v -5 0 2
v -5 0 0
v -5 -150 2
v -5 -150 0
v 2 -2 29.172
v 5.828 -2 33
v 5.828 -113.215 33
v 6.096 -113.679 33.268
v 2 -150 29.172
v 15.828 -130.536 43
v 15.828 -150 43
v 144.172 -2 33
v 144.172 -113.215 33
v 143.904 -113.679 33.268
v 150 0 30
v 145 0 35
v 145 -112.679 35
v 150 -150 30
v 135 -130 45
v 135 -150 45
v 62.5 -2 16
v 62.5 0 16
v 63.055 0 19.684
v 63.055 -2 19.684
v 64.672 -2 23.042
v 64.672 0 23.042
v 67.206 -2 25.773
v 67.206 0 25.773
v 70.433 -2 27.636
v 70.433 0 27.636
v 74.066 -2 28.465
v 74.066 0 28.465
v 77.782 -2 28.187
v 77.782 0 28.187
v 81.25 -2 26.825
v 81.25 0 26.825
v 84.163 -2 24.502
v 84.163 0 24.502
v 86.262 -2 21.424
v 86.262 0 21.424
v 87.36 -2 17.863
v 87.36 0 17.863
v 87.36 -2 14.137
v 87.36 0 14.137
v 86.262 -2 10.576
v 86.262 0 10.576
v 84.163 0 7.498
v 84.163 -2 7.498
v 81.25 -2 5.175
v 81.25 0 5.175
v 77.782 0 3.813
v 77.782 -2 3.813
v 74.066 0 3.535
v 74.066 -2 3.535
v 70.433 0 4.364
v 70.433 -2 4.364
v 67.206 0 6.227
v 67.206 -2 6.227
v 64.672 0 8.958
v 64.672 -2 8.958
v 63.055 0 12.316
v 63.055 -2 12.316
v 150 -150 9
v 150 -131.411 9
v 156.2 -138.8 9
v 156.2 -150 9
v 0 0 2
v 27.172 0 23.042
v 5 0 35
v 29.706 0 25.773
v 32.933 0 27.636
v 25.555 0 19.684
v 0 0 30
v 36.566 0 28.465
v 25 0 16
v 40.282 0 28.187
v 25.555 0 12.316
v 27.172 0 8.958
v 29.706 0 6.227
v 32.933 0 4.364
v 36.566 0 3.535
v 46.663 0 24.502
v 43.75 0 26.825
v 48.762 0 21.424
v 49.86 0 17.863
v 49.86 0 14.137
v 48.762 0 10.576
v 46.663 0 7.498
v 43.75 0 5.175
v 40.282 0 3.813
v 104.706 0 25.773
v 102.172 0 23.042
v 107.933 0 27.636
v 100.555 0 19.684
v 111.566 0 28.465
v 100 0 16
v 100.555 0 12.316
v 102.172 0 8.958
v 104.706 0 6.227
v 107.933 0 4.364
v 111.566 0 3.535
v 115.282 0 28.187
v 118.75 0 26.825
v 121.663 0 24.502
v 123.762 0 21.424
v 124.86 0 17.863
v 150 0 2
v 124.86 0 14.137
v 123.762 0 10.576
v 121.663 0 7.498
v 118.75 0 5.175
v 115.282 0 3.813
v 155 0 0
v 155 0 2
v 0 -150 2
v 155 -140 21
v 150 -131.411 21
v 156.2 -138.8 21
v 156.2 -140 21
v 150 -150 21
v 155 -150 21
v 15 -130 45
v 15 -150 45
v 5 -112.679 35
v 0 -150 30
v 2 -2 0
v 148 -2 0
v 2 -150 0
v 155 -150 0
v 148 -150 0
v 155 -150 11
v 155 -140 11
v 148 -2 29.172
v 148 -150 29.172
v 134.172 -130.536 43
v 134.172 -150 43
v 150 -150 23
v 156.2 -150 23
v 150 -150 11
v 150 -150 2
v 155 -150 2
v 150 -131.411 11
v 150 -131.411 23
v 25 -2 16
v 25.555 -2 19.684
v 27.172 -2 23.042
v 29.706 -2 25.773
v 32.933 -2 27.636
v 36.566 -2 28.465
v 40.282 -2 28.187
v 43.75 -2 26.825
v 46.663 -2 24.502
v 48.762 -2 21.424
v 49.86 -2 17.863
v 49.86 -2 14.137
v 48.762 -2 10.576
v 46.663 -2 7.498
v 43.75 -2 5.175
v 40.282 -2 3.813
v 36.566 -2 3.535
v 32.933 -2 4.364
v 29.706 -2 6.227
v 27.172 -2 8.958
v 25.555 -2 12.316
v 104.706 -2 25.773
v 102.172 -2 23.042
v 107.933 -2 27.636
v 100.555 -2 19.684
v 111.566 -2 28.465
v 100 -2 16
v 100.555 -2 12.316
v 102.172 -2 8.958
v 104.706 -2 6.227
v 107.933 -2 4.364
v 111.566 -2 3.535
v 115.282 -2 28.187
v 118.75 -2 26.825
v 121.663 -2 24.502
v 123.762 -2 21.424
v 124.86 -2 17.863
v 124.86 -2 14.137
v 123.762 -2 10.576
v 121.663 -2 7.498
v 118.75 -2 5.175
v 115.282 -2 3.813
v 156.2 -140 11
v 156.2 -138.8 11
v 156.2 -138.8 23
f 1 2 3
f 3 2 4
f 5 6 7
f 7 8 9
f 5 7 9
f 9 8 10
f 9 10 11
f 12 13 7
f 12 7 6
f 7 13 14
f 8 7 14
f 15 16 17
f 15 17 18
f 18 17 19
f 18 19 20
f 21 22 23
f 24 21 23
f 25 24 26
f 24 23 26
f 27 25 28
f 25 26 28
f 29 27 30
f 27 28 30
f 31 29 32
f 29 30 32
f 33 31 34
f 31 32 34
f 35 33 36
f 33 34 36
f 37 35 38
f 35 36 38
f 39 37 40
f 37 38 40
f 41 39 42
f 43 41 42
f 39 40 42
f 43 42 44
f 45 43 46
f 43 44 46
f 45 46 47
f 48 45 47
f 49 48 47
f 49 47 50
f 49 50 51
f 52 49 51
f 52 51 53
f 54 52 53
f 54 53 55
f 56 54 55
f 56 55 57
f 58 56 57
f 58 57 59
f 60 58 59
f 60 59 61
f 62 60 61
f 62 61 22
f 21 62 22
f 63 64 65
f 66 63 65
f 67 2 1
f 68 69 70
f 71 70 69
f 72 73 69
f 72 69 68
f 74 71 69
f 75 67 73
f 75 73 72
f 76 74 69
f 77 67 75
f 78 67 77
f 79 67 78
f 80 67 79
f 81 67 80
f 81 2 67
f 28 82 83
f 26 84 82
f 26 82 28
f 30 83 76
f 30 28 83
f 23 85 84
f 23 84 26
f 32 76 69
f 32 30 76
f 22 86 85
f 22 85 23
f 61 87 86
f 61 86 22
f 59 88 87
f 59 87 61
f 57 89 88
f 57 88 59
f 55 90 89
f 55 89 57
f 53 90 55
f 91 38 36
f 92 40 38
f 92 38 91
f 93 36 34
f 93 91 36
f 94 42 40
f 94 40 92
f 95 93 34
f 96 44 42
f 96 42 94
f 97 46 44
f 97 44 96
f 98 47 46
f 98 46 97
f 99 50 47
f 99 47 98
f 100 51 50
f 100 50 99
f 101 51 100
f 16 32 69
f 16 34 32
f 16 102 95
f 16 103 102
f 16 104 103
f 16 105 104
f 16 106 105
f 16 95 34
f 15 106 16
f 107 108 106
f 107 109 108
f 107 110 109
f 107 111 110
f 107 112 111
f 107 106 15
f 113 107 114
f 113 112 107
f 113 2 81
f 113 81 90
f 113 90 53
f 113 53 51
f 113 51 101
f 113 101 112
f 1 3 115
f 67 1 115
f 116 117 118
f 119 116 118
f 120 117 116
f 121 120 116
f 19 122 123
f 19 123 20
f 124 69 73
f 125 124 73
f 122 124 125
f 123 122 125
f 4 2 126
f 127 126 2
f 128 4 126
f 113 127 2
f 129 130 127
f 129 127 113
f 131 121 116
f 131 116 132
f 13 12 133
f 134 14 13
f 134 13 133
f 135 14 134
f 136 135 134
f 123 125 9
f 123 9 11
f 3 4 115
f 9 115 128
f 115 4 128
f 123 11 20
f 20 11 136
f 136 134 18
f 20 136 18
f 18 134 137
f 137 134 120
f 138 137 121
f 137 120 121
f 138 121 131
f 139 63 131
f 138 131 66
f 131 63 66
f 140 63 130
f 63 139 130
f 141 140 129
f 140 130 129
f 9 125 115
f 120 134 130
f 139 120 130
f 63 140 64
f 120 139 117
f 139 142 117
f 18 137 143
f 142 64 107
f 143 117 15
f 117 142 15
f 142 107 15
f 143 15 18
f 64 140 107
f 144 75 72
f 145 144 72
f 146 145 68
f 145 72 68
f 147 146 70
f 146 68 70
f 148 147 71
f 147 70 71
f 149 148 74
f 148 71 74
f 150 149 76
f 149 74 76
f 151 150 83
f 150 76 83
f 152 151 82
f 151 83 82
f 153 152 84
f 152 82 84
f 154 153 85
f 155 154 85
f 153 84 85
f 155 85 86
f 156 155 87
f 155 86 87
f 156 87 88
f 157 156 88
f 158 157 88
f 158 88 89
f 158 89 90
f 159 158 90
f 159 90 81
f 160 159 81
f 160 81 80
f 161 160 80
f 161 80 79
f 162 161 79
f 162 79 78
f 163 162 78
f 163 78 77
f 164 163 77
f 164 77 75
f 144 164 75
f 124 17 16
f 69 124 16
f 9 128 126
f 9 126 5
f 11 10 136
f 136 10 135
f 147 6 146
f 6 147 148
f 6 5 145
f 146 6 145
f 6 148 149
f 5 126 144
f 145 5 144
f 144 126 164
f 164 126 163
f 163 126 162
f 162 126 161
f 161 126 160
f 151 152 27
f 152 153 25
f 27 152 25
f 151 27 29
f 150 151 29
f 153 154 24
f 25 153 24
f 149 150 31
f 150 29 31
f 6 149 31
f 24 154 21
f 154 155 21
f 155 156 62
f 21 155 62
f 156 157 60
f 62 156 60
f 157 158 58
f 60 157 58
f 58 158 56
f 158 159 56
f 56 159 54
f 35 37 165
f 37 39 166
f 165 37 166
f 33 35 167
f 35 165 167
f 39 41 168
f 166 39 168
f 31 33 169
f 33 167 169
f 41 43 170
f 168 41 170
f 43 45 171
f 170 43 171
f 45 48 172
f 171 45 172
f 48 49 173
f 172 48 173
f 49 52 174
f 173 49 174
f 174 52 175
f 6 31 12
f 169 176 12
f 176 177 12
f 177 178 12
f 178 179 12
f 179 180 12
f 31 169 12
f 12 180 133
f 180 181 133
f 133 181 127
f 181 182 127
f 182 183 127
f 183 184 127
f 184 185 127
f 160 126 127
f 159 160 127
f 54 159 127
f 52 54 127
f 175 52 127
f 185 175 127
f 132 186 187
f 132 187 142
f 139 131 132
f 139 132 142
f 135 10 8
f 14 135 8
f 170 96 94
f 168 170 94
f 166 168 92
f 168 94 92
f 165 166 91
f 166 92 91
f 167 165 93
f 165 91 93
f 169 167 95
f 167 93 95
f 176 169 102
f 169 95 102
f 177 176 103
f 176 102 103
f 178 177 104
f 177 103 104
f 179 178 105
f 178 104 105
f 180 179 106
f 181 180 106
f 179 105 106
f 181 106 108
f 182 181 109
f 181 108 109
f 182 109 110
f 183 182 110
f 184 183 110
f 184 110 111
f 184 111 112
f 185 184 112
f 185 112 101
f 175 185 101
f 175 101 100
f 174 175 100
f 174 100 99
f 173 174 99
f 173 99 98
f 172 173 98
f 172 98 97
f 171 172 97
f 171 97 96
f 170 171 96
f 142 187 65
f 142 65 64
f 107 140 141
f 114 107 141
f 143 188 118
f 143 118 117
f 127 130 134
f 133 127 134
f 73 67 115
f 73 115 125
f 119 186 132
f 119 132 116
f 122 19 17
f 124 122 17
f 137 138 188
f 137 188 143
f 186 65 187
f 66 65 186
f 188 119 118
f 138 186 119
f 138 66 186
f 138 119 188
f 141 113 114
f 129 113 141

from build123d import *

# Parameters (mm, degrees)
F0_W        = 150
F0_H        = 45
F1_DEPTH    = 150
F2_W        = 5
F2_H        = 150
F3_DEPTH    = 2
F5_DEPTH    = 150
F6_SIZE     = 15
F7_T        = 2
F7_T3_DEPTH = 154
F7_T5_DEPTH = 144
F8_R        = 12.5
F9_DEPTH    = 25
F11_DEPTH   = 10
F13_DEPTH   = 14
F14_W       = 5
F14_H       = 10
F15_DEPTH   = 25
F16_W       = 1.2
F16_H       = 10
F16_W_2     = 1.4301043111
F17_DEPTH   = 6.2


# Not quite as in the source:
# - a shell that OpenCascade refuses in one call is made with other operations: the cavity is built on its own and cut out


with BuildPart() as f1:
    # F0 (on Front) → F1 (new body)
    with BuildSketch(Plane.XZ):
        with Locations((75, 22.5)):
            Rectangle(F0_W, F0_H)
    extrude(amount=F1_DEPTH)

    # F2 (on face) → F3 (join)
    with BuildSketch(Plane(origin=(0, 0, 0), x_dir=(1, 0, 0), z_dir=(0, 0, -1))):
        with Locations((152.5, 75)):
            Rectangle(F2_W, F2_H)
        with Locations((-2.5, 75)):
            Rectangle(F2_W, F2_H)
    extrude(amount=-F3_DEPTH)

    # F4 (on face) → F5 (cut, through all)
    with BuildSketch(Plane.YZ.offset(150)):
        Polygon((0, 35), (0, 45), (-130, 45), (-112.6794919243, 35), align=None)
    extrude(amount=-F5_DEPTH, mode=Mode.SUBTRACT)

    # F6
    f6_edges = [f1.edges().sort_by_distance(p)[0] for p in [
        (0, -140, 45),
        (150, -140, 45),
    ]]
    chamfer(f6_edges, length=F6_SIZE)

    # F7: shell of thickness 2, made by hand


with BuildPart() as f7_core1:
    # F7_t2: copy of F1
    add(f1.part)

    # the walls: a layer under each face that stays
    f7_faces = [f7_core1.faces().sort_by_distance(p)[0] for p in [
        (0, -75, 16),
        (75, 0, 17.5),
        (2.5, -25, 32.5),
        (-2.5, -75, 2),
        (75, -56.3397459622, 35),
        (147.5, -25, 32.5),
        (150, -75, 16),
        (152.5, -75, 2),
        (155, -75, 1),
        (-5, -75, 1),
        (75, -121.3397459622, 40),
        (75, -140, 45),
    ]]
    thicken(f7_faces, amount=-F7_T, mode=Mode.SUBTRACT)

    # F7_s4 → F7_t3 (cut)
    with BuildSketch(Plane.XZ.offset(-2)):
        Polygon((-0.02, 2.02), (2, 2), (2, 0), (0, 0), align=None)
        Polygon((150.02, 2.02), (148, 2), (148, 0), (150, 0), align=None)
    extrude(amount=F7_T3_DEPTH, mode=Mode.SUBTRACT)

    # F7_s6 → F7_t5 (cut)
    with BuildSketch(Plane.YZ.offset(3)):
        Polygon((-112.6694919243, 35.0373205081), (-112.6794919243, 33), (-113.2153903092, 33), (-113.6794919243, 33.2679491924), align=None)
    extrude(amount=F7_T5_DEPTH, mode=Mode.SUBTRACT)


with BuildPart() as f1_1:
    add(f1.part)

    # what is left inside the walls is the cavity
    f7_cavity = [f7_core1.part.solids().sort_by_distance(p)[0] for p in [
        (75, -100.666667, 0.02),
    ]]
    add(f7_cavity, mode=Mode.SUBTRACT)

    # F8 (on face) → F9 (cut)
    with BuildSketch(Plane(origin=(0, 0, 0), x_dir=(-1, 0, 0), z_dir=(0, 1, 0))):
        with Locations((-112.5, 16)):
            Circle(F8_R)
        with Locations((-75, 16)):
            Circle(F8_R)
        with Locations((-37.5, 16)):
            Circle(F8_R)
    extrude(amount=-F9_DEPTH, mode=Mode.SUBTRACT)

    # F10 (on face) → F11 (join)
    with BuildSketch(Plane.XZ.offset(150)):
        Polygon((156.2, 9), (156.2, 23), (150, 23), (150, 21), (155, 21), (155, 11), (150, 11), (150, 9), align=None)
    extrude(amount=-F11_DEPTH)

    # F12 (on face) → F13 (join, through all)
    with BuildSketch(Plane.XY.offset(23)):
        Polygon((150, -140), (156.2, -140), (156.2, -138.8), (150, -131.4111277259), align=None)
    extrude(amount=-F13_DEPTH)

    # F14 (on face) → F15 (cut)
    with BuildSketch(Plane.XZ.offset(150)):
        with Locations((152.5, 16)):
            Rectangle(F14_W, F14_H)
    extrude(amount=-F15_DEPTH, mode=Mode.SUBTRACT)

    # F16 (on face) → F17 (cut, through all)
    with BuildSketch(Plane.YZ.offset(156.2)):
        with Locations((-139.4, 16)):
            Rectangle(F16_W, F16_H)
        with Locations((-138.0849478444, 16)):
            Rectangle(F16_W_2, F16_H)
    extrude(amount=-F17_DEPTH, mode=Mode.SUBTRACT)


solid = f1_1.part
